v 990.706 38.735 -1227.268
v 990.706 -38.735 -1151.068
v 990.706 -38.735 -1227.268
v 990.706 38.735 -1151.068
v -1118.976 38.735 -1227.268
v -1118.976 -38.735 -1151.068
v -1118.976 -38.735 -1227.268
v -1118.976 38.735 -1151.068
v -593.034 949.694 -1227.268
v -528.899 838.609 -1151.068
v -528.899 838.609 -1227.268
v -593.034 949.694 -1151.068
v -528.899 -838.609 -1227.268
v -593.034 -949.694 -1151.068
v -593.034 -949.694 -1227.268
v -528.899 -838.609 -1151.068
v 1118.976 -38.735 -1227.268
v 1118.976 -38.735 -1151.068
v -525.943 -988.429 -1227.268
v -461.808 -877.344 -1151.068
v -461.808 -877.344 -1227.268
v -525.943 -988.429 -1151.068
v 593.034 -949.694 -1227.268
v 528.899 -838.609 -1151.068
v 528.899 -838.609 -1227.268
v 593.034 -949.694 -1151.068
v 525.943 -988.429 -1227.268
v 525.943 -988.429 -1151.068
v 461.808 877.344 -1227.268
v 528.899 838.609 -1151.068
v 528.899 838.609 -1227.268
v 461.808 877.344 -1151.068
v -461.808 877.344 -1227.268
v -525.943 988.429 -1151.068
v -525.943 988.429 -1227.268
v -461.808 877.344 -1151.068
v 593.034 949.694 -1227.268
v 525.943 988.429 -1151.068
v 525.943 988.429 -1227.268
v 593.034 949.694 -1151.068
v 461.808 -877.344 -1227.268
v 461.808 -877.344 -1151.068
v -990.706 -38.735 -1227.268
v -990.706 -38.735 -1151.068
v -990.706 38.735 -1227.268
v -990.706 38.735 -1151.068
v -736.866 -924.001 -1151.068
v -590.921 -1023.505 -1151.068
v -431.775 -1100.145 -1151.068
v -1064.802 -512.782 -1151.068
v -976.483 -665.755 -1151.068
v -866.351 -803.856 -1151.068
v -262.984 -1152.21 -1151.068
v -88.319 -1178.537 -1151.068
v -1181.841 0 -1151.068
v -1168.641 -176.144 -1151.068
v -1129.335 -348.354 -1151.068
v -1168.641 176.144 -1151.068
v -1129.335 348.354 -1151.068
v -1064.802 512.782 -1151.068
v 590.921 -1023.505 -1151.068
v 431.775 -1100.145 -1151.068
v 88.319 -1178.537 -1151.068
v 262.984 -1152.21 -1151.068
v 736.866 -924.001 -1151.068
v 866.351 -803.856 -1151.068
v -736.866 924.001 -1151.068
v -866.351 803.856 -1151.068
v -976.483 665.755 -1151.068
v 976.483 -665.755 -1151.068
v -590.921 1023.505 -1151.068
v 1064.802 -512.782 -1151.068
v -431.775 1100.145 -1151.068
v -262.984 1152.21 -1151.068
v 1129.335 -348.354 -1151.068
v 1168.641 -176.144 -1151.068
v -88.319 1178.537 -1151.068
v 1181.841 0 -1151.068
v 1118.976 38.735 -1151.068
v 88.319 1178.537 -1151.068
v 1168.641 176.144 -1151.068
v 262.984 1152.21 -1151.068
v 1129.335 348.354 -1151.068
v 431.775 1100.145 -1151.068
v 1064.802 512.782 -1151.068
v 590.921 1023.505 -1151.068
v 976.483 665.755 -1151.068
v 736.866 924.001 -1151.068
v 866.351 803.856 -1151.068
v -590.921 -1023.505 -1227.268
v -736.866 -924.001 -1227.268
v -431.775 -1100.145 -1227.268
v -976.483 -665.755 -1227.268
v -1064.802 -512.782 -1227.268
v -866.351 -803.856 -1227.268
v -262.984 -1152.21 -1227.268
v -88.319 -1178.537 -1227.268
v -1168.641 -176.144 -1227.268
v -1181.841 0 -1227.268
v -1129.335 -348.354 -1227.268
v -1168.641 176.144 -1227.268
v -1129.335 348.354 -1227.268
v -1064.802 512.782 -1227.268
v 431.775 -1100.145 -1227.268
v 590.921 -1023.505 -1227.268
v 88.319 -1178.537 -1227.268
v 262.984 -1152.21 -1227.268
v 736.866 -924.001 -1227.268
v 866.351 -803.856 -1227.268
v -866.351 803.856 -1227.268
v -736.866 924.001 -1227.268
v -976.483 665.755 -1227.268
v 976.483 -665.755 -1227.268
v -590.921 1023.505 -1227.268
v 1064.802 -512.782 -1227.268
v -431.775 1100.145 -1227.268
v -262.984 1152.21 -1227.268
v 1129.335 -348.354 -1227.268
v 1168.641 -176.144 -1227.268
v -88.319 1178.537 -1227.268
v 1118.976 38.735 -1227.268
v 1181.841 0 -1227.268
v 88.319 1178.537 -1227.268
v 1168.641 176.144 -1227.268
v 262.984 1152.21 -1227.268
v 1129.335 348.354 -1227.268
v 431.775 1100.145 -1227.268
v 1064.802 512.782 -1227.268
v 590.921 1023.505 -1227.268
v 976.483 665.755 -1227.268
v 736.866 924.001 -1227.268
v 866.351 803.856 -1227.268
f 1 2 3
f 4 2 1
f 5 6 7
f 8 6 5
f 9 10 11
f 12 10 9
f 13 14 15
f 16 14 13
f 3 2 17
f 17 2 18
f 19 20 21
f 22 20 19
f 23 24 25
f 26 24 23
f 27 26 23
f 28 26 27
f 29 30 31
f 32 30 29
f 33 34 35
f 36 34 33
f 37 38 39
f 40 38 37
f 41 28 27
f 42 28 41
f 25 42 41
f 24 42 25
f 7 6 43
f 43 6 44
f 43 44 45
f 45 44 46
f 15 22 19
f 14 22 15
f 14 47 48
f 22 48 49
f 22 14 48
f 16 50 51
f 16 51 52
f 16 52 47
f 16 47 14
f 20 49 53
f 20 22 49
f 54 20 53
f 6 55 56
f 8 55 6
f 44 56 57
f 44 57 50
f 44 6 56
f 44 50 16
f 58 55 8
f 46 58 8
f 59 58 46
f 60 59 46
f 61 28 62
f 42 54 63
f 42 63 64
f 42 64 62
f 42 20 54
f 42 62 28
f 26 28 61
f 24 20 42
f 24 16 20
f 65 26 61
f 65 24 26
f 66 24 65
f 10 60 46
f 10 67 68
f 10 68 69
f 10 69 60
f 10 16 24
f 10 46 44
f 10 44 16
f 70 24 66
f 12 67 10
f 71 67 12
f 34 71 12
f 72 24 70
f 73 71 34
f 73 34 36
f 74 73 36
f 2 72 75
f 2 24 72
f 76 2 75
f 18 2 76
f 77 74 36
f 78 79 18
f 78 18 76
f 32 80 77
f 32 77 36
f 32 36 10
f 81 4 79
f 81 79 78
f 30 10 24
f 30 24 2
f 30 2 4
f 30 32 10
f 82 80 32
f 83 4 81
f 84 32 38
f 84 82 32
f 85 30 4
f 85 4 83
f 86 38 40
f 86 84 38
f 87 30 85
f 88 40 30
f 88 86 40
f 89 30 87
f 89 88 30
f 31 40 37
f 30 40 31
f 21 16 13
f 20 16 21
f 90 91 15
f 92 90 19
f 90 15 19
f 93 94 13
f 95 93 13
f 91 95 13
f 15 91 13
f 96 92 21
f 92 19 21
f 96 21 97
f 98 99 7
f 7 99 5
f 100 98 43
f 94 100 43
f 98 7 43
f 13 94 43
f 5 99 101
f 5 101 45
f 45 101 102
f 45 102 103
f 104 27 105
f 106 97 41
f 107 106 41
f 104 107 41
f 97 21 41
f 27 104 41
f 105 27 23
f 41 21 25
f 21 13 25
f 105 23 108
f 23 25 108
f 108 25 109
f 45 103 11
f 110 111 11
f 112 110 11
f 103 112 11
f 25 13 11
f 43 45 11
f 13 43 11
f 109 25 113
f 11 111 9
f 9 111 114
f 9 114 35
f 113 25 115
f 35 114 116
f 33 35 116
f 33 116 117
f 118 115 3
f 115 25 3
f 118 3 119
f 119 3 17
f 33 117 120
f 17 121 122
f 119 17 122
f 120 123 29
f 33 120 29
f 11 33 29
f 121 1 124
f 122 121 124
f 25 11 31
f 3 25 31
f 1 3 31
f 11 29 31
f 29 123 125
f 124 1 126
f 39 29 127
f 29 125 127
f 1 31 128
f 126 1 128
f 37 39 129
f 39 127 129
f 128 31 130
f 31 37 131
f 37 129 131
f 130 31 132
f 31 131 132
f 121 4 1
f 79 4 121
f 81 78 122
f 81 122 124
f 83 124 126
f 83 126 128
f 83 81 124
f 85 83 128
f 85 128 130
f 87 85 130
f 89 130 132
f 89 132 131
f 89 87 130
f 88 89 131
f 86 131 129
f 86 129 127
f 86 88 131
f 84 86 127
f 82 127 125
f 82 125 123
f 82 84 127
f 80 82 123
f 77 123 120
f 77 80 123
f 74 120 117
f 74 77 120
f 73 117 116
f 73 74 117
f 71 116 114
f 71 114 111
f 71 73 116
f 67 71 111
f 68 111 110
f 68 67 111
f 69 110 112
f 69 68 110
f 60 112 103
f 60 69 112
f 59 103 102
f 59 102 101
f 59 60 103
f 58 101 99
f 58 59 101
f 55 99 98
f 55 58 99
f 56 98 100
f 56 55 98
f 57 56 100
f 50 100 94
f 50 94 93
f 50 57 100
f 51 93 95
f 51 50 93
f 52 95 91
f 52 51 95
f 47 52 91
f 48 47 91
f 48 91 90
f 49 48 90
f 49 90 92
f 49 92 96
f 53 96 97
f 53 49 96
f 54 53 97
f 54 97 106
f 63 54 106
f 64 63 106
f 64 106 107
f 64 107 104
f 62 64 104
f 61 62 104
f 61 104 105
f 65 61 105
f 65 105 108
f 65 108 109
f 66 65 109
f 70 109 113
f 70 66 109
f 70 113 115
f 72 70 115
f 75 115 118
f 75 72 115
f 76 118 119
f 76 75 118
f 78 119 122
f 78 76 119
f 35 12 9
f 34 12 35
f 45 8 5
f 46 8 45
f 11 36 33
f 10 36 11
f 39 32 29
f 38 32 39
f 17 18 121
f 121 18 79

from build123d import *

# Parameters (mm, degrees)
F2_R     = 1181.8412542343
F2_W     = 128.27
F2_H     = 77.47
F3_DEPTH = 76.2


with BuildPart() as f3:
    # F2 (on face) → F3 (new body)
    with BuildSketch(Plane.XY.offset(-1151.068019867)):
        Circle(F2_R)
        Polygon((-525.9426331016, -988.4293623985), (-593.0336211327, -949.6943623985), (-528.8986211327, -838.609283855), (-461.8076331016, -877.344283855), align=None, mode=Mode.SUBTRACT)
        Polygon((593.0336211327, -949.6943623985), (525.9426331016, -988.4293623985), (461.8076331016, -877.344283855), (528.8986211327, -838.609283855), align=None, mode=Mode.SUBTRACT)
        with Locations((-1054.8412542343, 0)):
            Rectangle(F2_W, F2_H, mode=Mode.SUBTRACT)
        Polygon((-593.0336211327, 949.6943623985), (-525.9426331016, 988.4293623985), (-461.8076331016, 877.344283855), (-528.8986211327, 838.609283855), align=None, mode=Mode.SUBTRACT)
        with Locations((1054.8412542343, 0)):
            Rectangle(F2_W, F2_H, mode=Mode.SUBTRACT)
        Polygon((525.9426331016, 988.4293623985), (593.0336211327, 949.6943623985), (528.8986211327, 838.609283855), (461.8076331016, 877.344283855), align=None, mode=Mode.SUBTRACT)
    extrude(amount=-F3_DEPTH)


solid = f3.part
